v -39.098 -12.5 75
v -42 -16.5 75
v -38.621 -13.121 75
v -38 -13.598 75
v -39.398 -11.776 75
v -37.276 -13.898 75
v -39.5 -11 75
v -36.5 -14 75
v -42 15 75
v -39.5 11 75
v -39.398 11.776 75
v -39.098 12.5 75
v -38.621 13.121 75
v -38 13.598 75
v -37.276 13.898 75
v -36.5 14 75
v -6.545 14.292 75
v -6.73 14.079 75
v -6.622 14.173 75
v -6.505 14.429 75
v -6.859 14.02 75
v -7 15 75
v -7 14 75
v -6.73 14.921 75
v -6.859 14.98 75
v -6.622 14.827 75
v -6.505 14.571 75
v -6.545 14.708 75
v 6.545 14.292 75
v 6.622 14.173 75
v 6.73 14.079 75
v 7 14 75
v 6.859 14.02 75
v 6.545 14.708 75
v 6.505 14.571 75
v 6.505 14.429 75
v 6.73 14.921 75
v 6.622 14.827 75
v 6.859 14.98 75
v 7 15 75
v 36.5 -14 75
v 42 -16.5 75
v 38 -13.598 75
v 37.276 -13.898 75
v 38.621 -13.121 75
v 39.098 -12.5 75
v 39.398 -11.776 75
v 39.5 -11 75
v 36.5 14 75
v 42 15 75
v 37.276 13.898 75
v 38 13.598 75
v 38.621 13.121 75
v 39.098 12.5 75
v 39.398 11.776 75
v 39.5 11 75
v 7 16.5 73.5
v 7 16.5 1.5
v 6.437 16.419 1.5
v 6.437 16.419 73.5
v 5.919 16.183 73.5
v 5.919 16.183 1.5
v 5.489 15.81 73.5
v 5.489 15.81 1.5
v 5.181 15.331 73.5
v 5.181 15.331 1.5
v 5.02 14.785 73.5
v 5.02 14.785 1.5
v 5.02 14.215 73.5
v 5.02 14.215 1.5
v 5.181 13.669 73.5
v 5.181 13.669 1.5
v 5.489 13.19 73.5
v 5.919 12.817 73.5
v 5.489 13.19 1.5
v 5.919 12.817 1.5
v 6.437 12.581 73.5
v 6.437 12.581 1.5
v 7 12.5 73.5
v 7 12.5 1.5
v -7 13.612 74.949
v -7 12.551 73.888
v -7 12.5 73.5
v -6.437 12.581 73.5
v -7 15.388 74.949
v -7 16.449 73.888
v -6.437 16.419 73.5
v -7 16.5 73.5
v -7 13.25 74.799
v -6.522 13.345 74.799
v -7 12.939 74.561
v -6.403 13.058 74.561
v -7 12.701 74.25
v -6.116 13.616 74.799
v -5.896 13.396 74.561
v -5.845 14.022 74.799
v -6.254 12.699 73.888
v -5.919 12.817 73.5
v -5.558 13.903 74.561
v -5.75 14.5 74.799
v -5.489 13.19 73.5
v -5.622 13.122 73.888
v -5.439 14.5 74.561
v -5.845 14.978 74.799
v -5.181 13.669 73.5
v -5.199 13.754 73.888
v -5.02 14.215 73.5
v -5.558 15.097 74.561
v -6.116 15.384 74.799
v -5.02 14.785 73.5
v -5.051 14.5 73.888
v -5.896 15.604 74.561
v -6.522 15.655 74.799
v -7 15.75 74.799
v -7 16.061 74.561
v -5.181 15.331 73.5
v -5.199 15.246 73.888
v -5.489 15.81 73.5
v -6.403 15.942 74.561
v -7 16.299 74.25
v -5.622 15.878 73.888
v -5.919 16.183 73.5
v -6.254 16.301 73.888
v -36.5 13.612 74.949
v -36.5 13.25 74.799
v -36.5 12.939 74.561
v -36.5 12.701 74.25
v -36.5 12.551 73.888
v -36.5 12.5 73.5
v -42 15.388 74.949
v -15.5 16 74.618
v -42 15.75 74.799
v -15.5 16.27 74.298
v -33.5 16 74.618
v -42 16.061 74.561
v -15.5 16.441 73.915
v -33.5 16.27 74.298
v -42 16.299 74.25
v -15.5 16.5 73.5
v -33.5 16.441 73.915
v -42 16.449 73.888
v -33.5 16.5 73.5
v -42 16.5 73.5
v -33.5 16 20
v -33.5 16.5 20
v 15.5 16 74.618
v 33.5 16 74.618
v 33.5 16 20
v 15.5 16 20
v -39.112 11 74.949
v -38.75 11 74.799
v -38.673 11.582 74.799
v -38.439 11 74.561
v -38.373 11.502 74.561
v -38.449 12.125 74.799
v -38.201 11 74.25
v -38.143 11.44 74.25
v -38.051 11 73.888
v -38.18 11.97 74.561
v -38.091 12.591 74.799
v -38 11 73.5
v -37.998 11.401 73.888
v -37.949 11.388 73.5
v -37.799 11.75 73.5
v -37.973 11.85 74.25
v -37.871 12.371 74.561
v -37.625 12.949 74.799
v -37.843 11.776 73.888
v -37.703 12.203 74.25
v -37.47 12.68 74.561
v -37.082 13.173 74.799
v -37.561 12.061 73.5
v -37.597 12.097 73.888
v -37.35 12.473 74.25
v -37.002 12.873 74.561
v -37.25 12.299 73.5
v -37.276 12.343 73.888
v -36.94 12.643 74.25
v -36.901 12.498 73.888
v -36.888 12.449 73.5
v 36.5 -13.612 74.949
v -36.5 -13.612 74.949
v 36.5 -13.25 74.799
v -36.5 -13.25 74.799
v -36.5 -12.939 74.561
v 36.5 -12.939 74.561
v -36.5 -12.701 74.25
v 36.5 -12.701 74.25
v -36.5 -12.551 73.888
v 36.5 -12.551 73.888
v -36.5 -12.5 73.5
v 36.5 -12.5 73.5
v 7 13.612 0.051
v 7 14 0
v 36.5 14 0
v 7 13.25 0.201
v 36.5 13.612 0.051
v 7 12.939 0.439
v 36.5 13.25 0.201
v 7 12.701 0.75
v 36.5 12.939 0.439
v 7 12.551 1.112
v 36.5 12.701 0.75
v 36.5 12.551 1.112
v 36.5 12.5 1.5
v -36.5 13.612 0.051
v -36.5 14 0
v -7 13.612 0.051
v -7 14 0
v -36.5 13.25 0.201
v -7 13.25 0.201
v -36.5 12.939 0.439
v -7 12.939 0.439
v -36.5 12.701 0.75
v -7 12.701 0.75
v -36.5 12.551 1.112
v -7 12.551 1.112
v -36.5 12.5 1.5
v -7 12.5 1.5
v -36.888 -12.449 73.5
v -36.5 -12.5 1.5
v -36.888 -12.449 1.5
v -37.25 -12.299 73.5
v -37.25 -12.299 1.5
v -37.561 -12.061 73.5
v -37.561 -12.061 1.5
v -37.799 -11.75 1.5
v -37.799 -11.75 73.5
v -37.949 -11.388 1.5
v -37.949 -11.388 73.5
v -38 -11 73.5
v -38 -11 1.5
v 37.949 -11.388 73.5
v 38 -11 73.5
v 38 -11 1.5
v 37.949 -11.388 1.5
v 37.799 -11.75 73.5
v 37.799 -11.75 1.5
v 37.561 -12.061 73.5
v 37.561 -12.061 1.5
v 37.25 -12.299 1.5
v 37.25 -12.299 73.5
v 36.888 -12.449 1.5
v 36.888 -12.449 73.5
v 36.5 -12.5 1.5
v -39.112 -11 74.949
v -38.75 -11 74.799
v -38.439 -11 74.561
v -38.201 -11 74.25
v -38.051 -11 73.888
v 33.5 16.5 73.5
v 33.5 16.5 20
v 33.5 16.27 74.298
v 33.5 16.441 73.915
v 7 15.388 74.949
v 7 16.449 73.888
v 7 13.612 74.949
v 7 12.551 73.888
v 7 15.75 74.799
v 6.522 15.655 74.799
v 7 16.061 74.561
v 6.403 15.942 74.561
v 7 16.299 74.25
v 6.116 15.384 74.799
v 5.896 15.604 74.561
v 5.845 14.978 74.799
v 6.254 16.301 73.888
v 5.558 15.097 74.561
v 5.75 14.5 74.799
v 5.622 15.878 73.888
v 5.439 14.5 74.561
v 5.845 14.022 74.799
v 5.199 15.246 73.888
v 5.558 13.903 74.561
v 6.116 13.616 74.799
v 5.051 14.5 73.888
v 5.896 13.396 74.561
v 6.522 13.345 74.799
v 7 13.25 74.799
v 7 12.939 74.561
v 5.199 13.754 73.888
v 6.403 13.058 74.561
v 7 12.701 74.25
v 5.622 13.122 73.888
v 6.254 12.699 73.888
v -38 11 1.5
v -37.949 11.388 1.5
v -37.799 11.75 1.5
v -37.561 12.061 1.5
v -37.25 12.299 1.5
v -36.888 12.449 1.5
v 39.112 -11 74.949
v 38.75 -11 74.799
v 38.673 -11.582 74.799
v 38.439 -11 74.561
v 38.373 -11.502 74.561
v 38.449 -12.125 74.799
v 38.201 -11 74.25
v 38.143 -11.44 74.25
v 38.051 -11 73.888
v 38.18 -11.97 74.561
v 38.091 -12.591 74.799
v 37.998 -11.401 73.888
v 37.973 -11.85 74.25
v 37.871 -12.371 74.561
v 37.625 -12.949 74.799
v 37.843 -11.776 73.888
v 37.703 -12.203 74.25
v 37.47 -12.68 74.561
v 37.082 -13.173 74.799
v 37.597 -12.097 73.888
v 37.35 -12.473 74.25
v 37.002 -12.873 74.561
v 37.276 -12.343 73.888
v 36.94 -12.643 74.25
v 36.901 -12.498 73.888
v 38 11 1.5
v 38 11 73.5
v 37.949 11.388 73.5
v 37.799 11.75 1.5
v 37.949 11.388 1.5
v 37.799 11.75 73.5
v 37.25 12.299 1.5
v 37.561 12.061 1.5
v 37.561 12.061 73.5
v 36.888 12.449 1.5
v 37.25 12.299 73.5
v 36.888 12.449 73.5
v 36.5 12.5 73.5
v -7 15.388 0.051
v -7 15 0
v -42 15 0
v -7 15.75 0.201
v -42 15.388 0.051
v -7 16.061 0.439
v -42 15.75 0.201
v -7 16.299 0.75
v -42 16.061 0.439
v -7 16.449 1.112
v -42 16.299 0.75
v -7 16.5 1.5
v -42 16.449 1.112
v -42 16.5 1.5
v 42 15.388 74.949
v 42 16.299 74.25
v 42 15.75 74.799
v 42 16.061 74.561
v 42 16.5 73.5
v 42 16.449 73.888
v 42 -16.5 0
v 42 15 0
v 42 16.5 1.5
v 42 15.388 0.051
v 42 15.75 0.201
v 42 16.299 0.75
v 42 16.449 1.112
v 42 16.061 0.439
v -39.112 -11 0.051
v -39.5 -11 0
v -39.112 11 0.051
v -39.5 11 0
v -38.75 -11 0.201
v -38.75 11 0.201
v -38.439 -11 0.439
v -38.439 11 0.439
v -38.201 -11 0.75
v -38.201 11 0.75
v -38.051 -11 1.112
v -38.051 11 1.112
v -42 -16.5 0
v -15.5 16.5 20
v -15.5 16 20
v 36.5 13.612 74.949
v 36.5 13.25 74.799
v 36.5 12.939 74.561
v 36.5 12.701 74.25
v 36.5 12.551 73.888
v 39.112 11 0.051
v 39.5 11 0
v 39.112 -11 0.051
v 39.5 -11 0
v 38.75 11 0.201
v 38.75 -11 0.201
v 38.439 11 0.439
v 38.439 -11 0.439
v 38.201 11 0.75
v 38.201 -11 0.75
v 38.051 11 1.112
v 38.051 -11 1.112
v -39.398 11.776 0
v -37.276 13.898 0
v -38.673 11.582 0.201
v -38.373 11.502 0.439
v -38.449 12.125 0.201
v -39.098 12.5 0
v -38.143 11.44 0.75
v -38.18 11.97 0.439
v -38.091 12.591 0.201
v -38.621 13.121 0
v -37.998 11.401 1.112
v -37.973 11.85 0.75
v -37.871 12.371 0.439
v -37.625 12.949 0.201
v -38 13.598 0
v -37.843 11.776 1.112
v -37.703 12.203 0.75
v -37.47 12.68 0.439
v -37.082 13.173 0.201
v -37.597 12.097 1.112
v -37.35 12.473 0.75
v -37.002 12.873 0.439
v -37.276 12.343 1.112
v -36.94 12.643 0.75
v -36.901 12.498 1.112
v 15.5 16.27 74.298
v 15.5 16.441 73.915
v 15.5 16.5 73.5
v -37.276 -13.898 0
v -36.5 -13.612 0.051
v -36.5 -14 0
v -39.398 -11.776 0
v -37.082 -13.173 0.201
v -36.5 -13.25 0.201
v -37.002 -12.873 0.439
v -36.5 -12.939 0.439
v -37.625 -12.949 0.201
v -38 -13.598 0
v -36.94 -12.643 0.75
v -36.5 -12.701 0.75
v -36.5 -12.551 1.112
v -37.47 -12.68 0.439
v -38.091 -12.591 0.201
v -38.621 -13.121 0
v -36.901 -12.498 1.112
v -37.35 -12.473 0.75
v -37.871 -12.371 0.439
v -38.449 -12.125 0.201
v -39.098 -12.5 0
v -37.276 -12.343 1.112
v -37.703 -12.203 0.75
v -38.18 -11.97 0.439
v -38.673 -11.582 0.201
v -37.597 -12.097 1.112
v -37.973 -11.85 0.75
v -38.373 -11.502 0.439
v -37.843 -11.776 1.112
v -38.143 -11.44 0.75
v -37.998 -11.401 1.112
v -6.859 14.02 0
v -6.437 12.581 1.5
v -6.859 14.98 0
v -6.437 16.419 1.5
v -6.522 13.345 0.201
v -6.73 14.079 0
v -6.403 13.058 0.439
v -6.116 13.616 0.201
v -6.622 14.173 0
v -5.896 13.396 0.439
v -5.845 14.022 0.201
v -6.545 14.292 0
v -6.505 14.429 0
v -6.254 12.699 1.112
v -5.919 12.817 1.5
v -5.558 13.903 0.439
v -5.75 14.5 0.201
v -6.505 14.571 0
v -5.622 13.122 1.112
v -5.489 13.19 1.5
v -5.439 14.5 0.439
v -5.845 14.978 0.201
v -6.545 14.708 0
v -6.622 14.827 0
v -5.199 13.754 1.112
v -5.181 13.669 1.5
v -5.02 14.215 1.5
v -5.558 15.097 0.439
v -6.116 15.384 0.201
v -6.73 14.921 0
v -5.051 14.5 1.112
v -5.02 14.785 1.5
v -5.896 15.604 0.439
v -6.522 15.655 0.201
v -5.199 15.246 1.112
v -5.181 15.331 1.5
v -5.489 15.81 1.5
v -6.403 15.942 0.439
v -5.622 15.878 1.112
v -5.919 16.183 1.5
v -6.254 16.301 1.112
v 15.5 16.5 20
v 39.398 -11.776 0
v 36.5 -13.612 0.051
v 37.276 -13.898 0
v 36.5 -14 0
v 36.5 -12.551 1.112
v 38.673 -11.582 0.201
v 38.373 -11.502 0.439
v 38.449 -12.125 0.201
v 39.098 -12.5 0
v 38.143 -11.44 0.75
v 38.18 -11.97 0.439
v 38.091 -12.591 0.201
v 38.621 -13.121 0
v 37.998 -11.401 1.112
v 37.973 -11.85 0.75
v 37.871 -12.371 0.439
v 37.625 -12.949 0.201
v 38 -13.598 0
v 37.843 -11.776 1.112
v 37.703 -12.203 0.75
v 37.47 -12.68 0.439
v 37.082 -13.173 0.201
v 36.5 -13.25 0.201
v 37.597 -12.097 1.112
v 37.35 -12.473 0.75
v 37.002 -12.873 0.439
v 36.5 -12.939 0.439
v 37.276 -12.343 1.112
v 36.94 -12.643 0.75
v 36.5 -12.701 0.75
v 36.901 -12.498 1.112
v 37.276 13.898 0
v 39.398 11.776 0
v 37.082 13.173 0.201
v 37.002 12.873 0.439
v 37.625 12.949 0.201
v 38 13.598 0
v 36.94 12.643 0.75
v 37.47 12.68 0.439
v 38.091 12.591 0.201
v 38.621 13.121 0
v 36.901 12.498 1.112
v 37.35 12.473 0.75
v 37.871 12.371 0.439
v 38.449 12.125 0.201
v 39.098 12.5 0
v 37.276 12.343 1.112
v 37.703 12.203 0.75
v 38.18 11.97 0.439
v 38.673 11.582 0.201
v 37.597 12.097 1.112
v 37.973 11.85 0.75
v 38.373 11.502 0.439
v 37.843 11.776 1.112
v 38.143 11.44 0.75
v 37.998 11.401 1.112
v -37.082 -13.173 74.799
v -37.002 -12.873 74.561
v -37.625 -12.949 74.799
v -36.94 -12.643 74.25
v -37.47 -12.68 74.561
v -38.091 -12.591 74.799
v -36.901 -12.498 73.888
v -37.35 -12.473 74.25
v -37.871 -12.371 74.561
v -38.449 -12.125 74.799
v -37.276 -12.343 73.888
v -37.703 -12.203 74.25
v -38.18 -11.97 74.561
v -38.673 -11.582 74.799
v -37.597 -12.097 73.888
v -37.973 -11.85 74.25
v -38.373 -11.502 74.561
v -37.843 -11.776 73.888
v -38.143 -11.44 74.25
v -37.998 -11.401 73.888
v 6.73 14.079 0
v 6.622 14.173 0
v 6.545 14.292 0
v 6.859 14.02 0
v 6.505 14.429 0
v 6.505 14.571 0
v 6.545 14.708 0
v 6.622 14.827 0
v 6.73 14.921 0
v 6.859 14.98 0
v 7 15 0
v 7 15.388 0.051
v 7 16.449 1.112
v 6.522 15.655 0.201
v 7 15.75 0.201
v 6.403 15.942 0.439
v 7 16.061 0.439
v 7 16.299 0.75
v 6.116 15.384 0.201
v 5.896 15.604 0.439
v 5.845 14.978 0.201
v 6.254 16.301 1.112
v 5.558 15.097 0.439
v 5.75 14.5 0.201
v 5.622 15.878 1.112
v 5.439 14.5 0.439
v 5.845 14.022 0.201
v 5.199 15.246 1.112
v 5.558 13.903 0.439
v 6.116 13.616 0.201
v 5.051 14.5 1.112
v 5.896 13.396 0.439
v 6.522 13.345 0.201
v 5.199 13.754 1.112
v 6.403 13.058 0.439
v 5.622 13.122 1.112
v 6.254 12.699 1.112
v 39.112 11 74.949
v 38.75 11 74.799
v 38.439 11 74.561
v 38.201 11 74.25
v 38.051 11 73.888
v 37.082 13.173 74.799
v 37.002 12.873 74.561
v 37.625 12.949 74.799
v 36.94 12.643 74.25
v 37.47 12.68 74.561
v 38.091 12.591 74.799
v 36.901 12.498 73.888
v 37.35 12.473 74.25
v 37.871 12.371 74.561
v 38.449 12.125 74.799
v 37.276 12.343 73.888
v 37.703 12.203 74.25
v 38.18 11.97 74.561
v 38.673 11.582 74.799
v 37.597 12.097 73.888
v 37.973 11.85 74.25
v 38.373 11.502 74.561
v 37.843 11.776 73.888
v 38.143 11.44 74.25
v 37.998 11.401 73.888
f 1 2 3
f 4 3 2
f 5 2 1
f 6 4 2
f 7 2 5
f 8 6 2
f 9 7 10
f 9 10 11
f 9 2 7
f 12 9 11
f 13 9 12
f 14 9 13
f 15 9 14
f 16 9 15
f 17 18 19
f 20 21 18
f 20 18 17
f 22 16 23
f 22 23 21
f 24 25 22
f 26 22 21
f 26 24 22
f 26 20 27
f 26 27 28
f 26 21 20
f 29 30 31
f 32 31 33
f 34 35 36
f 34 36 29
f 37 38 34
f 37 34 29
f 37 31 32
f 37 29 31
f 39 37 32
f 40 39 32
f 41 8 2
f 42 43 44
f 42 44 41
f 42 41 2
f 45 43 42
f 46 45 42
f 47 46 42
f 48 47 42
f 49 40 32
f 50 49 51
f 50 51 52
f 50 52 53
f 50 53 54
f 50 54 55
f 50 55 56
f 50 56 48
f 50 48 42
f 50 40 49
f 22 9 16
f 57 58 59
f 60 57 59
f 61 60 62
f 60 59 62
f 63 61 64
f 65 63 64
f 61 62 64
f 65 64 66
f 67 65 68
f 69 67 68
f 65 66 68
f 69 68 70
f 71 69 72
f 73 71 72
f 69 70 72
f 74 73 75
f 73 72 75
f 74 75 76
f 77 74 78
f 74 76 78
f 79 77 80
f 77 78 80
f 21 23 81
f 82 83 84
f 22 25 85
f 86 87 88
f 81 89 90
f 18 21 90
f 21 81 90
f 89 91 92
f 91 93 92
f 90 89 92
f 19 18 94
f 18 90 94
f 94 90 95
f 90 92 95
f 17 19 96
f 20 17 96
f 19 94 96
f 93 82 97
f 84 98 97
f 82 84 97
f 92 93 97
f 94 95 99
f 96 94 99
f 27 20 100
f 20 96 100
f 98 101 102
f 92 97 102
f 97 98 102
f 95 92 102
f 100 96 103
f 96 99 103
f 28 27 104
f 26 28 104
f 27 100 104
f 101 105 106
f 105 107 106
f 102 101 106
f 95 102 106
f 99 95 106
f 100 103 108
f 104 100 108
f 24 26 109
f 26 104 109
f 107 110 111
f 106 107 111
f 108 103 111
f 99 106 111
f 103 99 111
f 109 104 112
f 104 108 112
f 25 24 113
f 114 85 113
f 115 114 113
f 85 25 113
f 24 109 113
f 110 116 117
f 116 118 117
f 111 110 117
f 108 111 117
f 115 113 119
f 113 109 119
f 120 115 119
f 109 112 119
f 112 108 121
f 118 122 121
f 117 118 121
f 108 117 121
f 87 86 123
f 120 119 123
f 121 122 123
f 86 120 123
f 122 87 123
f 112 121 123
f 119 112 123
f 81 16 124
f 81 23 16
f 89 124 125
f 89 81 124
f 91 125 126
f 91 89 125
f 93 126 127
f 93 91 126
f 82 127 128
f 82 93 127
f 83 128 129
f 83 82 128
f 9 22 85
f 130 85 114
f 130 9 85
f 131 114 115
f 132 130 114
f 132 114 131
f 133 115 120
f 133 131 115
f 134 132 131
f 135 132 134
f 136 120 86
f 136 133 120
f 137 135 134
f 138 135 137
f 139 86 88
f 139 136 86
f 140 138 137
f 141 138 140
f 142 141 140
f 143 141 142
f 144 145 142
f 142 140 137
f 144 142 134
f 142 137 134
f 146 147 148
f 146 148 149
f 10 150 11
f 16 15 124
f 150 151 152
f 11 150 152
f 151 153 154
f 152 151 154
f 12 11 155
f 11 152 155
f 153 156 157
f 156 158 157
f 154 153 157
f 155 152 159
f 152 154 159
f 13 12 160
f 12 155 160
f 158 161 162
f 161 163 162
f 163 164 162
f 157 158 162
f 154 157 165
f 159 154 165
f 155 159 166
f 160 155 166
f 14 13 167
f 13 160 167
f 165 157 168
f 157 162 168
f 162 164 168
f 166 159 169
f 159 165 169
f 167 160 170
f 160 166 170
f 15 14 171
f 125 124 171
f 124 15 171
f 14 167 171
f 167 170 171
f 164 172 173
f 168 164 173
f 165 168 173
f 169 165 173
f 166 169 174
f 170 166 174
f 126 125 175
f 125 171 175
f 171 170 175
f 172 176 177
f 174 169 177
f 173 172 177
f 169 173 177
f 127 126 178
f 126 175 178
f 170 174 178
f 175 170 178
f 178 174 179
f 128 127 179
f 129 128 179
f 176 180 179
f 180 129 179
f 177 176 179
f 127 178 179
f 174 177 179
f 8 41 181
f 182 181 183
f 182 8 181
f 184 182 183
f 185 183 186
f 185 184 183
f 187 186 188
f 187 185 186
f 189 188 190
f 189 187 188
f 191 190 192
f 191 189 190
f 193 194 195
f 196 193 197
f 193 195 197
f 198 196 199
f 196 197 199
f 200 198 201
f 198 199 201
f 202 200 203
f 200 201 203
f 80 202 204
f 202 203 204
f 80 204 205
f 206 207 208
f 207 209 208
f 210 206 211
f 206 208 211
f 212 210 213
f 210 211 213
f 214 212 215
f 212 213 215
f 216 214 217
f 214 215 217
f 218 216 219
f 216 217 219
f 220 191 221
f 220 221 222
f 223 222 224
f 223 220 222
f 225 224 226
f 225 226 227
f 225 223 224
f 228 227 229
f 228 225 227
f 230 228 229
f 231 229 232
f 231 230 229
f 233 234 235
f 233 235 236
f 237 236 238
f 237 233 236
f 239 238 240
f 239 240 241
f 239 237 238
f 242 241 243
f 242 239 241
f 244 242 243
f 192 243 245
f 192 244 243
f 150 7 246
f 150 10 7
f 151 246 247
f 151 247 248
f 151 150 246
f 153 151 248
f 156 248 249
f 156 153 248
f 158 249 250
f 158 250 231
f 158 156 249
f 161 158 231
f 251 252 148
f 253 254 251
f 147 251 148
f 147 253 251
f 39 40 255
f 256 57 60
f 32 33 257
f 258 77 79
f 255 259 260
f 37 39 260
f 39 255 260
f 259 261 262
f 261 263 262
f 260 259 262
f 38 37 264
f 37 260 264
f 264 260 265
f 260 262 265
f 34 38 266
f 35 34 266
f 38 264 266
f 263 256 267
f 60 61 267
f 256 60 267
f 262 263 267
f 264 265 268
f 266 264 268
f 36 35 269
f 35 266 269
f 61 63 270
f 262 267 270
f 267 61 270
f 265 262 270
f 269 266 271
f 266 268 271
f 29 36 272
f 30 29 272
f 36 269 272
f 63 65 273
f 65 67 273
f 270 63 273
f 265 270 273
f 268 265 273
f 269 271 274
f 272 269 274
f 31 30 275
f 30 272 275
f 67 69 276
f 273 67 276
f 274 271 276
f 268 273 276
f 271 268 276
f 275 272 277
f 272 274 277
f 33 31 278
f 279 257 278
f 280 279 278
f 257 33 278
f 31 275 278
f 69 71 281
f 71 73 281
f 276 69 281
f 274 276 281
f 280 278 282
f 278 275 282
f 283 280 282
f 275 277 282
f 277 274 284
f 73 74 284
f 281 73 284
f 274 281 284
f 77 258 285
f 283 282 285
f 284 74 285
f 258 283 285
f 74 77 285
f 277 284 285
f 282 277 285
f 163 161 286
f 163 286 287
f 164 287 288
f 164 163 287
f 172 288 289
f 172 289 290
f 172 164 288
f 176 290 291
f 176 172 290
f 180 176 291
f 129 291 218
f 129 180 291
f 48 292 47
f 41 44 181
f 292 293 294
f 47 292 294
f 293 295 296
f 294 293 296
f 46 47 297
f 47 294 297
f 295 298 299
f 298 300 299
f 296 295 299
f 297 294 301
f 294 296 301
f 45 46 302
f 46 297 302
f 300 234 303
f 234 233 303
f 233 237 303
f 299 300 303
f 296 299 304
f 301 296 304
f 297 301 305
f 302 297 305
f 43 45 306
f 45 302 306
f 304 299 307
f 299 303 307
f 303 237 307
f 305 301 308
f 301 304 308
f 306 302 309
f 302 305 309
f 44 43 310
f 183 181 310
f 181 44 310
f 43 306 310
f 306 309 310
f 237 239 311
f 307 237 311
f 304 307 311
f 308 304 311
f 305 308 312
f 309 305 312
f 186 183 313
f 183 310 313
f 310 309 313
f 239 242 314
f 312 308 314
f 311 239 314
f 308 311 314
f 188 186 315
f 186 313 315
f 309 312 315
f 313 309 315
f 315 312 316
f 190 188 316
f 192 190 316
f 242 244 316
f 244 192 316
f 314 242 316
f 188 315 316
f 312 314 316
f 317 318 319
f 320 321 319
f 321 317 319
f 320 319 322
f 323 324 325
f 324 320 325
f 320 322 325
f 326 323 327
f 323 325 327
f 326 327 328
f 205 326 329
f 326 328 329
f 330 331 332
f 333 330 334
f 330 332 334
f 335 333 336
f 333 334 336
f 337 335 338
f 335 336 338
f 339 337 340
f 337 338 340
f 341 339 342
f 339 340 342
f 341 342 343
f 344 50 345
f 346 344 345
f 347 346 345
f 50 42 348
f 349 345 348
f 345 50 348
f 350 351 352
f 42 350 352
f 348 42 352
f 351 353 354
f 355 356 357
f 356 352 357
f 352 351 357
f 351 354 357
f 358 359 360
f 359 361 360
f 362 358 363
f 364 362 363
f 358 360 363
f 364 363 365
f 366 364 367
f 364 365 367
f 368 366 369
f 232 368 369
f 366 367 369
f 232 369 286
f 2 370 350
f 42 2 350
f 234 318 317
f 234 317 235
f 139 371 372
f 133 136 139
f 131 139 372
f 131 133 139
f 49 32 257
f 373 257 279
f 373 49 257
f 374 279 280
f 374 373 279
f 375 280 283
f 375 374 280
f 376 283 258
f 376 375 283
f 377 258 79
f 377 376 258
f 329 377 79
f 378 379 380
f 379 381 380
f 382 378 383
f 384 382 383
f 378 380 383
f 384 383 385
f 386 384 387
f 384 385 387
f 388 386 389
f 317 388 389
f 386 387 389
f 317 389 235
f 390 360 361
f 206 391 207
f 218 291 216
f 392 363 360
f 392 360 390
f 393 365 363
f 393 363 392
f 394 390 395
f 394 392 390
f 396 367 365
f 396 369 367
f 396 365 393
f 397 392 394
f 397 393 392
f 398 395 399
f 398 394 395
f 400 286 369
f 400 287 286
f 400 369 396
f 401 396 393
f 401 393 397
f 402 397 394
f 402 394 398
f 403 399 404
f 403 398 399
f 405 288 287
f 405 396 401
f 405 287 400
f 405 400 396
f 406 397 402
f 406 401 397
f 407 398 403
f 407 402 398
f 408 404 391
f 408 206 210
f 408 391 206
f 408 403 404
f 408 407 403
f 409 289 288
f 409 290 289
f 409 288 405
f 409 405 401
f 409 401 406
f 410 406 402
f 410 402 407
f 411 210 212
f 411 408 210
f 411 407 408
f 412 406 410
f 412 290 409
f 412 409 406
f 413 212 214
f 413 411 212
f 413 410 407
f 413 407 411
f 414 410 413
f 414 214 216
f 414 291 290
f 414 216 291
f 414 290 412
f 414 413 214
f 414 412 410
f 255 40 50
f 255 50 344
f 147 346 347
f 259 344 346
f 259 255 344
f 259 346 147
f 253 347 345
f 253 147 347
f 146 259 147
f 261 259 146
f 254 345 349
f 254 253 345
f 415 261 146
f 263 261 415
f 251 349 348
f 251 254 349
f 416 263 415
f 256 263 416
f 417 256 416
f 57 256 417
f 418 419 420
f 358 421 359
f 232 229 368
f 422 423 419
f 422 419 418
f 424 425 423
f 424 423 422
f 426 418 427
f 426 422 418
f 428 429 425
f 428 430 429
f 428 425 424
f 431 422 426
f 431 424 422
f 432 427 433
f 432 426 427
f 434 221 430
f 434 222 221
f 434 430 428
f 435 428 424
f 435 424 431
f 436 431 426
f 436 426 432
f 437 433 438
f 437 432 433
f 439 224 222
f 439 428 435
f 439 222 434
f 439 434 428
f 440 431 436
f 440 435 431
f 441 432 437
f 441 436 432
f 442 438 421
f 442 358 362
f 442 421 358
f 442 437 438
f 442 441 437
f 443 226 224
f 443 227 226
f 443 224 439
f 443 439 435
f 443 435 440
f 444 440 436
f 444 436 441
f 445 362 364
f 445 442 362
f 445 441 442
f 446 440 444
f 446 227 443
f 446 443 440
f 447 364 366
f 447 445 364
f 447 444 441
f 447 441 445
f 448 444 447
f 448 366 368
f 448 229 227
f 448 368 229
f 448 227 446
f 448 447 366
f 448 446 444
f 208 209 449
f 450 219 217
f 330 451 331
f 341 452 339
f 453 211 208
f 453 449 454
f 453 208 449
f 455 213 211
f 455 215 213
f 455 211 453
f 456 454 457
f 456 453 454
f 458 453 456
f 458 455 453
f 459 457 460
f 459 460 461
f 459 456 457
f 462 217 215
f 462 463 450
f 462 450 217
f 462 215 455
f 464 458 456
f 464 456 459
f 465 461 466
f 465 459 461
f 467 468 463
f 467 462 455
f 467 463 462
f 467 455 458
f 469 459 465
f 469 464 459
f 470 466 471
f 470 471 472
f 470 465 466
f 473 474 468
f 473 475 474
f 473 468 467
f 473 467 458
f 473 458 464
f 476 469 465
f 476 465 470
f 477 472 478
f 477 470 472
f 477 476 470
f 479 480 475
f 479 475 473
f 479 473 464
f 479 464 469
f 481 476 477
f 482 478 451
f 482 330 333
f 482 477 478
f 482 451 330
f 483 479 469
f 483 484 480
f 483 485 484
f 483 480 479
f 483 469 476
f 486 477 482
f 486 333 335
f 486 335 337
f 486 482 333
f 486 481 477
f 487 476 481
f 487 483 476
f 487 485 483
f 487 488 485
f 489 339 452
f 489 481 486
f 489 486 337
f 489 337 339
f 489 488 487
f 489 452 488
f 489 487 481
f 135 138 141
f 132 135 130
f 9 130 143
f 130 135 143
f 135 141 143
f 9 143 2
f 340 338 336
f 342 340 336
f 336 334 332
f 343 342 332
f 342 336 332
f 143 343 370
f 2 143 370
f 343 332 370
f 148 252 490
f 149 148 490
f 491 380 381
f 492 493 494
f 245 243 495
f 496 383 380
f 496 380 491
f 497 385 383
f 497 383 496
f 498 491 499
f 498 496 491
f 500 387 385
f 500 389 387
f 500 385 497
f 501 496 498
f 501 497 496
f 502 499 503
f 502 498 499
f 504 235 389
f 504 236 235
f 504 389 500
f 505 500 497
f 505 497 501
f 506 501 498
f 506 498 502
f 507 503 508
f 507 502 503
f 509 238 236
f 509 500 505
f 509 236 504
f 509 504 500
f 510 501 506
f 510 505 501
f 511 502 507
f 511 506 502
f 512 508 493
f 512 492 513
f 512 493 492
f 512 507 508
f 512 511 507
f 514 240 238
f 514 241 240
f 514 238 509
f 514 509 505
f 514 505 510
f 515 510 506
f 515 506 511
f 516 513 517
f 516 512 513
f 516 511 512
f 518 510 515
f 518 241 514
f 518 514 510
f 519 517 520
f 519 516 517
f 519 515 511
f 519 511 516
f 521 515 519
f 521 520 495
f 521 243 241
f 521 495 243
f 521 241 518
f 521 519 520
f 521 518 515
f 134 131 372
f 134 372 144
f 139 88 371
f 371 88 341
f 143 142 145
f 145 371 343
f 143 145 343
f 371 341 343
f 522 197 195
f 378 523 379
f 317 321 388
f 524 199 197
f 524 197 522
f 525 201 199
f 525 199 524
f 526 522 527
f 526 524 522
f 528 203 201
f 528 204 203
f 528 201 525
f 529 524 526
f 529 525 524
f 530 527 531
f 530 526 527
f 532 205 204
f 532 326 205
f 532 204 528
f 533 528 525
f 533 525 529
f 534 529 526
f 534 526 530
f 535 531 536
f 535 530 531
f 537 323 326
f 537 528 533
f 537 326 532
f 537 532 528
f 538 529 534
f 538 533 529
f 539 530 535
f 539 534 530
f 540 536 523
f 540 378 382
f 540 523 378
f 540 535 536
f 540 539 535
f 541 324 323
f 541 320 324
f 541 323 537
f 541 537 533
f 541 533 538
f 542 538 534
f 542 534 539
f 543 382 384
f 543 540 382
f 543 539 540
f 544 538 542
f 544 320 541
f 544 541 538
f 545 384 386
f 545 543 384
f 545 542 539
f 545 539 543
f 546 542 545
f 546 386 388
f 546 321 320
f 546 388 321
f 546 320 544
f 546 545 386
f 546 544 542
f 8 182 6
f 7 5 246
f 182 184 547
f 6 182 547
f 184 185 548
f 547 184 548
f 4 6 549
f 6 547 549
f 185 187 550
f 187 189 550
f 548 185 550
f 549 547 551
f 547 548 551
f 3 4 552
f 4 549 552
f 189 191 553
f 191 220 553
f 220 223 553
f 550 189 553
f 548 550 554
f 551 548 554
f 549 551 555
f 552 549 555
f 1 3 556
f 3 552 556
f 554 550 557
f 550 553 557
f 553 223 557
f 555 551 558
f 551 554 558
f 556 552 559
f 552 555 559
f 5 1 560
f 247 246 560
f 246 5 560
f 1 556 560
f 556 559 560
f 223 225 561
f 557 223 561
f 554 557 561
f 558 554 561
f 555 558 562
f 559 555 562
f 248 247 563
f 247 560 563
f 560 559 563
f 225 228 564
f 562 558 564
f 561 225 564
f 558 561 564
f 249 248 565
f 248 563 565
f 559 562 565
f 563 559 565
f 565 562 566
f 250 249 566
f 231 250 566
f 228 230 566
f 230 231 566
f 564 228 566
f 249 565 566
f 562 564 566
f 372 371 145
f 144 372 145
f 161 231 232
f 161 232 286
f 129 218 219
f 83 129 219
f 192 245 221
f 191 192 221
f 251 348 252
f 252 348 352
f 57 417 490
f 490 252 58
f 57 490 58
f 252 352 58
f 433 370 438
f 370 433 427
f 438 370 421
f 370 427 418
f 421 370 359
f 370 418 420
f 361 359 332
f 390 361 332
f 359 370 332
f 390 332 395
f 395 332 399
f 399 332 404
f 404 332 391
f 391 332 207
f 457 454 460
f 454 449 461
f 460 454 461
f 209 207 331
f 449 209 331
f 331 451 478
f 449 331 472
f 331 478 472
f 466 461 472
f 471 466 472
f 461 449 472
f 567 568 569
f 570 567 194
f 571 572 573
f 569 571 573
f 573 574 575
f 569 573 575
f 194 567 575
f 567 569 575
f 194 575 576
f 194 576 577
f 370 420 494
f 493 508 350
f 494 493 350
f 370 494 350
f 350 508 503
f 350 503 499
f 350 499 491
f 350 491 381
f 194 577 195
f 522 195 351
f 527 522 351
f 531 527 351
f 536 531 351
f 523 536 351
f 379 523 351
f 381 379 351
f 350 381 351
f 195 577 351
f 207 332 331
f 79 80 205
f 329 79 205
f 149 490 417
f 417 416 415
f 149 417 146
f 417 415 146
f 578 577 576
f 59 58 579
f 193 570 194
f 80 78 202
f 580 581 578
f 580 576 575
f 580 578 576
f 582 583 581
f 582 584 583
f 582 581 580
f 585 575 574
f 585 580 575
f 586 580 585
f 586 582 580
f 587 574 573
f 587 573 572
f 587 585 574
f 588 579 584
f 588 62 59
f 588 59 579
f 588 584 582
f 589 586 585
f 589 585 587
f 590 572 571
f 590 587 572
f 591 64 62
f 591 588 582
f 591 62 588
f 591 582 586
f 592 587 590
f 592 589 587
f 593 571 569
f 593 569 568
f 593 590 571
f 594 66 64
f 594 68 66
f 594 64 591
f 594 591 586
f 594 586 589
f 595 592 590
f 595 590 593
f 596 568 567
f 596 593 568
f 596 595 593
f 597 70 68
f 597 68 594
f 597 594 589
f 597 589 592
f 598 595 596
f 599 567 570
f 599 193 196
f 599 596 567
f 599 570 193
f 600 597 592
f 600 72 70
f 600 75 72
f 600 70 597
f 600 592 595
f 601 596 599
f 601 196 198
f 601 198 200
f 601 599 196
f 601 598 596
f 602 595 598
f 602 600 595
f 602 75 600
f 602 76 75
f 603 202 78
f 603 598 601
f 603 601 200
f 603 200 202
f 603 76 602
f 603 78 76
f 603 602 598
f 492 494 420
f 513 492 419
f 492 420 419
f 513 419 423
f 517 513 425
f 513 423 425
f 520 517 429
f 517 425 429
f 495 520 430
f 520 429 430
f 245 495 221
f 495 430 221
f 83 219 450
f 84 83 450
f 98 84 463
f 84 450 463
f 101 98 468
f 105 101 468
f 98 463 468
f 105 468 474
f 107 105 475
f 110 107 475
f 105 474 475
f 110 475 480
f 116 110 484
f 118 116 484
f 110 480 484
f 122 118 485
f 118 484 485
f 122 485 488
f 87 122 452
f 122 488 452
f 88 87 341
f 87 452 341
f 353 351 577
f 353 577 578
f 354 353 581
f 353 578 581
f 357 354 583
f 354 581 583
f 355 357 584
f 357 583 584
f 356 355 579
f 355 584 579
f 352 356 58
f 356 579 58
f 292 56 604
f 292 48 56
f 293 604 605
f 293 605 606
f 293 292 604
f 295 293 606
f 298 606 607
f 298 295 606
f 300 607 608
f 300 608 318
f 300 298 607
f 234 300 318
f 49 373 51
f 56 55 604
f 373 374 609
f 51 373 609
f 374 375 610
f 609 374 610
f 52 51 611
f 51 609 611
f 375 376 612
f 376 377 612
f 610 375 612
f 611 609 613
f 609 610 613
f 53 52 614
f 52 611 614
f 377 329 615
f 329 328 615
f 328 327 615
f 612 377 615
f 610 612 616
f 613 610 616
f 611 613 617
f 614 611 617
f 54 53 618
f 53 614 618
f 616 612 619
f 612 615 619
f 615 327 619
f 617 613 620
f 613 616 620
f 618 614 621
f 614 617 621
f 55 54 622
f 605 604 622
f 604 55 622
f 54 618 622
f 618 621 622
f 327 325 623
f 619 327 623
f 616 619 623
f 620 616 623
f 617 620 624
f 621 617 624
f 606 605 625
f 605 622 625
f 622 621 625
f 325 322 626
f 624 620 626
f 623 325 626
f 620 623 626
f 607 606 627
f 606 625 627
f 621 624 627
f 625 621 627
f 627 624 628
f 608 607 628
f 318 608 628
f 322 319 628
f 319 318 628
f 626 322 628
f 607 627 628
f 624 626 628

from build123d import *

# Parameters (mm, degrees)
F1_DEPTH = 75
F2_F1_R  = 1.5
F2_F2_R  = 1.5
F4_W     = 18
F4_H     = 55
F5_DEPTH = 0.5


# Not quite as in the source:
# - a feature names something its author has since deleted; it is built from what else it names


with BuildPart() as f1:
    # F0 (on Top) → F1 (new body)
    with BuildSketch(Plane.XY):
        with BuildLine():
            Line((38, 12.5), (38, -12.5))
            Line((38, -12.5), (-38, -12.5))
            Line((-38, -12.5), (-38, 12.5))
            Line((-38, 12.5), (-7, 12.5))
            ThreePointArc((-7, 12.5), (-5, 14.5), (-7, 16.5))
            Line((-7, 16.5), (-42, 16.5))
            Line((-42, 16.5), (-42, -16.5))
            Line((-42, -16.5), (42, -16.5))
            Line((42, -16.5), (42, 16.5))
            Line((42, 16.5), (7, 16.5))
            ThreePointArc((7, 16.5), (5, 14.5), (7, 12.5))
            Line((7, 12.5), (38, 12.5))
        make_face()
    extrude(amount=F1_DEPTH)

    # F2: fillet of radius 1.5 on 12 edges, made by hand

    # F2_f1
    f2_f1_edges = [f1.edges().sort_by_distance(p)[0] for p in [
        (38, -12.5, 37.5),
        (-38, -12.5, 37.5),
        (-38, 12.5, 37.5),
        (38, 12.5, 37.5),
    ]]
    fillet(f2_f1_edges, radius=F2_F1_R)

    # F2_f2
    f2_f2_edges = [f1.edges().sort_by_distance(p)[0] for p in [
        (0, -12.5, 0),
        (0, -12.5, 75),
        (21.75, 12.5, 0),
        (21.75, 12.5, 75),
        (5, 14.5, 75),
        (24.5, 16.5, 75),
        (5, 14.5, 0),
        (24.5, 16.5, 0),
        (37.5606601718, 12.0606601718, 75),
        (37.5606601718, 12.0606601718, 0),
        (37.5606601718, -12.0606601718, 75),
        (-37.5606601718, -12.0606601718, 75),
        (37.5606601718, -12.0606601718, 0),
        (-37.5606601718, -12.0606601718, 0),
    ]]
    fillet(f2_f2_edges, radius=F2_F2_R)

    # F4 (on offset) → F5 (cut)
    with BuildSketch(Plane(origin=(0, 16.5, 0), x_dir=(-1, 0, 0), z_dir=(0, 1, 0))):
        with Locations((-24.5, 47.5)):
            Rectangle(F4_W, F4_H)
        with Locations((24.5, 47.5)):
            Rectangle(F4_W, F4_H)
    extrude(amount=-F5_DEPTH, mode=Mode.SUBTRACT)


solid = f1.part
